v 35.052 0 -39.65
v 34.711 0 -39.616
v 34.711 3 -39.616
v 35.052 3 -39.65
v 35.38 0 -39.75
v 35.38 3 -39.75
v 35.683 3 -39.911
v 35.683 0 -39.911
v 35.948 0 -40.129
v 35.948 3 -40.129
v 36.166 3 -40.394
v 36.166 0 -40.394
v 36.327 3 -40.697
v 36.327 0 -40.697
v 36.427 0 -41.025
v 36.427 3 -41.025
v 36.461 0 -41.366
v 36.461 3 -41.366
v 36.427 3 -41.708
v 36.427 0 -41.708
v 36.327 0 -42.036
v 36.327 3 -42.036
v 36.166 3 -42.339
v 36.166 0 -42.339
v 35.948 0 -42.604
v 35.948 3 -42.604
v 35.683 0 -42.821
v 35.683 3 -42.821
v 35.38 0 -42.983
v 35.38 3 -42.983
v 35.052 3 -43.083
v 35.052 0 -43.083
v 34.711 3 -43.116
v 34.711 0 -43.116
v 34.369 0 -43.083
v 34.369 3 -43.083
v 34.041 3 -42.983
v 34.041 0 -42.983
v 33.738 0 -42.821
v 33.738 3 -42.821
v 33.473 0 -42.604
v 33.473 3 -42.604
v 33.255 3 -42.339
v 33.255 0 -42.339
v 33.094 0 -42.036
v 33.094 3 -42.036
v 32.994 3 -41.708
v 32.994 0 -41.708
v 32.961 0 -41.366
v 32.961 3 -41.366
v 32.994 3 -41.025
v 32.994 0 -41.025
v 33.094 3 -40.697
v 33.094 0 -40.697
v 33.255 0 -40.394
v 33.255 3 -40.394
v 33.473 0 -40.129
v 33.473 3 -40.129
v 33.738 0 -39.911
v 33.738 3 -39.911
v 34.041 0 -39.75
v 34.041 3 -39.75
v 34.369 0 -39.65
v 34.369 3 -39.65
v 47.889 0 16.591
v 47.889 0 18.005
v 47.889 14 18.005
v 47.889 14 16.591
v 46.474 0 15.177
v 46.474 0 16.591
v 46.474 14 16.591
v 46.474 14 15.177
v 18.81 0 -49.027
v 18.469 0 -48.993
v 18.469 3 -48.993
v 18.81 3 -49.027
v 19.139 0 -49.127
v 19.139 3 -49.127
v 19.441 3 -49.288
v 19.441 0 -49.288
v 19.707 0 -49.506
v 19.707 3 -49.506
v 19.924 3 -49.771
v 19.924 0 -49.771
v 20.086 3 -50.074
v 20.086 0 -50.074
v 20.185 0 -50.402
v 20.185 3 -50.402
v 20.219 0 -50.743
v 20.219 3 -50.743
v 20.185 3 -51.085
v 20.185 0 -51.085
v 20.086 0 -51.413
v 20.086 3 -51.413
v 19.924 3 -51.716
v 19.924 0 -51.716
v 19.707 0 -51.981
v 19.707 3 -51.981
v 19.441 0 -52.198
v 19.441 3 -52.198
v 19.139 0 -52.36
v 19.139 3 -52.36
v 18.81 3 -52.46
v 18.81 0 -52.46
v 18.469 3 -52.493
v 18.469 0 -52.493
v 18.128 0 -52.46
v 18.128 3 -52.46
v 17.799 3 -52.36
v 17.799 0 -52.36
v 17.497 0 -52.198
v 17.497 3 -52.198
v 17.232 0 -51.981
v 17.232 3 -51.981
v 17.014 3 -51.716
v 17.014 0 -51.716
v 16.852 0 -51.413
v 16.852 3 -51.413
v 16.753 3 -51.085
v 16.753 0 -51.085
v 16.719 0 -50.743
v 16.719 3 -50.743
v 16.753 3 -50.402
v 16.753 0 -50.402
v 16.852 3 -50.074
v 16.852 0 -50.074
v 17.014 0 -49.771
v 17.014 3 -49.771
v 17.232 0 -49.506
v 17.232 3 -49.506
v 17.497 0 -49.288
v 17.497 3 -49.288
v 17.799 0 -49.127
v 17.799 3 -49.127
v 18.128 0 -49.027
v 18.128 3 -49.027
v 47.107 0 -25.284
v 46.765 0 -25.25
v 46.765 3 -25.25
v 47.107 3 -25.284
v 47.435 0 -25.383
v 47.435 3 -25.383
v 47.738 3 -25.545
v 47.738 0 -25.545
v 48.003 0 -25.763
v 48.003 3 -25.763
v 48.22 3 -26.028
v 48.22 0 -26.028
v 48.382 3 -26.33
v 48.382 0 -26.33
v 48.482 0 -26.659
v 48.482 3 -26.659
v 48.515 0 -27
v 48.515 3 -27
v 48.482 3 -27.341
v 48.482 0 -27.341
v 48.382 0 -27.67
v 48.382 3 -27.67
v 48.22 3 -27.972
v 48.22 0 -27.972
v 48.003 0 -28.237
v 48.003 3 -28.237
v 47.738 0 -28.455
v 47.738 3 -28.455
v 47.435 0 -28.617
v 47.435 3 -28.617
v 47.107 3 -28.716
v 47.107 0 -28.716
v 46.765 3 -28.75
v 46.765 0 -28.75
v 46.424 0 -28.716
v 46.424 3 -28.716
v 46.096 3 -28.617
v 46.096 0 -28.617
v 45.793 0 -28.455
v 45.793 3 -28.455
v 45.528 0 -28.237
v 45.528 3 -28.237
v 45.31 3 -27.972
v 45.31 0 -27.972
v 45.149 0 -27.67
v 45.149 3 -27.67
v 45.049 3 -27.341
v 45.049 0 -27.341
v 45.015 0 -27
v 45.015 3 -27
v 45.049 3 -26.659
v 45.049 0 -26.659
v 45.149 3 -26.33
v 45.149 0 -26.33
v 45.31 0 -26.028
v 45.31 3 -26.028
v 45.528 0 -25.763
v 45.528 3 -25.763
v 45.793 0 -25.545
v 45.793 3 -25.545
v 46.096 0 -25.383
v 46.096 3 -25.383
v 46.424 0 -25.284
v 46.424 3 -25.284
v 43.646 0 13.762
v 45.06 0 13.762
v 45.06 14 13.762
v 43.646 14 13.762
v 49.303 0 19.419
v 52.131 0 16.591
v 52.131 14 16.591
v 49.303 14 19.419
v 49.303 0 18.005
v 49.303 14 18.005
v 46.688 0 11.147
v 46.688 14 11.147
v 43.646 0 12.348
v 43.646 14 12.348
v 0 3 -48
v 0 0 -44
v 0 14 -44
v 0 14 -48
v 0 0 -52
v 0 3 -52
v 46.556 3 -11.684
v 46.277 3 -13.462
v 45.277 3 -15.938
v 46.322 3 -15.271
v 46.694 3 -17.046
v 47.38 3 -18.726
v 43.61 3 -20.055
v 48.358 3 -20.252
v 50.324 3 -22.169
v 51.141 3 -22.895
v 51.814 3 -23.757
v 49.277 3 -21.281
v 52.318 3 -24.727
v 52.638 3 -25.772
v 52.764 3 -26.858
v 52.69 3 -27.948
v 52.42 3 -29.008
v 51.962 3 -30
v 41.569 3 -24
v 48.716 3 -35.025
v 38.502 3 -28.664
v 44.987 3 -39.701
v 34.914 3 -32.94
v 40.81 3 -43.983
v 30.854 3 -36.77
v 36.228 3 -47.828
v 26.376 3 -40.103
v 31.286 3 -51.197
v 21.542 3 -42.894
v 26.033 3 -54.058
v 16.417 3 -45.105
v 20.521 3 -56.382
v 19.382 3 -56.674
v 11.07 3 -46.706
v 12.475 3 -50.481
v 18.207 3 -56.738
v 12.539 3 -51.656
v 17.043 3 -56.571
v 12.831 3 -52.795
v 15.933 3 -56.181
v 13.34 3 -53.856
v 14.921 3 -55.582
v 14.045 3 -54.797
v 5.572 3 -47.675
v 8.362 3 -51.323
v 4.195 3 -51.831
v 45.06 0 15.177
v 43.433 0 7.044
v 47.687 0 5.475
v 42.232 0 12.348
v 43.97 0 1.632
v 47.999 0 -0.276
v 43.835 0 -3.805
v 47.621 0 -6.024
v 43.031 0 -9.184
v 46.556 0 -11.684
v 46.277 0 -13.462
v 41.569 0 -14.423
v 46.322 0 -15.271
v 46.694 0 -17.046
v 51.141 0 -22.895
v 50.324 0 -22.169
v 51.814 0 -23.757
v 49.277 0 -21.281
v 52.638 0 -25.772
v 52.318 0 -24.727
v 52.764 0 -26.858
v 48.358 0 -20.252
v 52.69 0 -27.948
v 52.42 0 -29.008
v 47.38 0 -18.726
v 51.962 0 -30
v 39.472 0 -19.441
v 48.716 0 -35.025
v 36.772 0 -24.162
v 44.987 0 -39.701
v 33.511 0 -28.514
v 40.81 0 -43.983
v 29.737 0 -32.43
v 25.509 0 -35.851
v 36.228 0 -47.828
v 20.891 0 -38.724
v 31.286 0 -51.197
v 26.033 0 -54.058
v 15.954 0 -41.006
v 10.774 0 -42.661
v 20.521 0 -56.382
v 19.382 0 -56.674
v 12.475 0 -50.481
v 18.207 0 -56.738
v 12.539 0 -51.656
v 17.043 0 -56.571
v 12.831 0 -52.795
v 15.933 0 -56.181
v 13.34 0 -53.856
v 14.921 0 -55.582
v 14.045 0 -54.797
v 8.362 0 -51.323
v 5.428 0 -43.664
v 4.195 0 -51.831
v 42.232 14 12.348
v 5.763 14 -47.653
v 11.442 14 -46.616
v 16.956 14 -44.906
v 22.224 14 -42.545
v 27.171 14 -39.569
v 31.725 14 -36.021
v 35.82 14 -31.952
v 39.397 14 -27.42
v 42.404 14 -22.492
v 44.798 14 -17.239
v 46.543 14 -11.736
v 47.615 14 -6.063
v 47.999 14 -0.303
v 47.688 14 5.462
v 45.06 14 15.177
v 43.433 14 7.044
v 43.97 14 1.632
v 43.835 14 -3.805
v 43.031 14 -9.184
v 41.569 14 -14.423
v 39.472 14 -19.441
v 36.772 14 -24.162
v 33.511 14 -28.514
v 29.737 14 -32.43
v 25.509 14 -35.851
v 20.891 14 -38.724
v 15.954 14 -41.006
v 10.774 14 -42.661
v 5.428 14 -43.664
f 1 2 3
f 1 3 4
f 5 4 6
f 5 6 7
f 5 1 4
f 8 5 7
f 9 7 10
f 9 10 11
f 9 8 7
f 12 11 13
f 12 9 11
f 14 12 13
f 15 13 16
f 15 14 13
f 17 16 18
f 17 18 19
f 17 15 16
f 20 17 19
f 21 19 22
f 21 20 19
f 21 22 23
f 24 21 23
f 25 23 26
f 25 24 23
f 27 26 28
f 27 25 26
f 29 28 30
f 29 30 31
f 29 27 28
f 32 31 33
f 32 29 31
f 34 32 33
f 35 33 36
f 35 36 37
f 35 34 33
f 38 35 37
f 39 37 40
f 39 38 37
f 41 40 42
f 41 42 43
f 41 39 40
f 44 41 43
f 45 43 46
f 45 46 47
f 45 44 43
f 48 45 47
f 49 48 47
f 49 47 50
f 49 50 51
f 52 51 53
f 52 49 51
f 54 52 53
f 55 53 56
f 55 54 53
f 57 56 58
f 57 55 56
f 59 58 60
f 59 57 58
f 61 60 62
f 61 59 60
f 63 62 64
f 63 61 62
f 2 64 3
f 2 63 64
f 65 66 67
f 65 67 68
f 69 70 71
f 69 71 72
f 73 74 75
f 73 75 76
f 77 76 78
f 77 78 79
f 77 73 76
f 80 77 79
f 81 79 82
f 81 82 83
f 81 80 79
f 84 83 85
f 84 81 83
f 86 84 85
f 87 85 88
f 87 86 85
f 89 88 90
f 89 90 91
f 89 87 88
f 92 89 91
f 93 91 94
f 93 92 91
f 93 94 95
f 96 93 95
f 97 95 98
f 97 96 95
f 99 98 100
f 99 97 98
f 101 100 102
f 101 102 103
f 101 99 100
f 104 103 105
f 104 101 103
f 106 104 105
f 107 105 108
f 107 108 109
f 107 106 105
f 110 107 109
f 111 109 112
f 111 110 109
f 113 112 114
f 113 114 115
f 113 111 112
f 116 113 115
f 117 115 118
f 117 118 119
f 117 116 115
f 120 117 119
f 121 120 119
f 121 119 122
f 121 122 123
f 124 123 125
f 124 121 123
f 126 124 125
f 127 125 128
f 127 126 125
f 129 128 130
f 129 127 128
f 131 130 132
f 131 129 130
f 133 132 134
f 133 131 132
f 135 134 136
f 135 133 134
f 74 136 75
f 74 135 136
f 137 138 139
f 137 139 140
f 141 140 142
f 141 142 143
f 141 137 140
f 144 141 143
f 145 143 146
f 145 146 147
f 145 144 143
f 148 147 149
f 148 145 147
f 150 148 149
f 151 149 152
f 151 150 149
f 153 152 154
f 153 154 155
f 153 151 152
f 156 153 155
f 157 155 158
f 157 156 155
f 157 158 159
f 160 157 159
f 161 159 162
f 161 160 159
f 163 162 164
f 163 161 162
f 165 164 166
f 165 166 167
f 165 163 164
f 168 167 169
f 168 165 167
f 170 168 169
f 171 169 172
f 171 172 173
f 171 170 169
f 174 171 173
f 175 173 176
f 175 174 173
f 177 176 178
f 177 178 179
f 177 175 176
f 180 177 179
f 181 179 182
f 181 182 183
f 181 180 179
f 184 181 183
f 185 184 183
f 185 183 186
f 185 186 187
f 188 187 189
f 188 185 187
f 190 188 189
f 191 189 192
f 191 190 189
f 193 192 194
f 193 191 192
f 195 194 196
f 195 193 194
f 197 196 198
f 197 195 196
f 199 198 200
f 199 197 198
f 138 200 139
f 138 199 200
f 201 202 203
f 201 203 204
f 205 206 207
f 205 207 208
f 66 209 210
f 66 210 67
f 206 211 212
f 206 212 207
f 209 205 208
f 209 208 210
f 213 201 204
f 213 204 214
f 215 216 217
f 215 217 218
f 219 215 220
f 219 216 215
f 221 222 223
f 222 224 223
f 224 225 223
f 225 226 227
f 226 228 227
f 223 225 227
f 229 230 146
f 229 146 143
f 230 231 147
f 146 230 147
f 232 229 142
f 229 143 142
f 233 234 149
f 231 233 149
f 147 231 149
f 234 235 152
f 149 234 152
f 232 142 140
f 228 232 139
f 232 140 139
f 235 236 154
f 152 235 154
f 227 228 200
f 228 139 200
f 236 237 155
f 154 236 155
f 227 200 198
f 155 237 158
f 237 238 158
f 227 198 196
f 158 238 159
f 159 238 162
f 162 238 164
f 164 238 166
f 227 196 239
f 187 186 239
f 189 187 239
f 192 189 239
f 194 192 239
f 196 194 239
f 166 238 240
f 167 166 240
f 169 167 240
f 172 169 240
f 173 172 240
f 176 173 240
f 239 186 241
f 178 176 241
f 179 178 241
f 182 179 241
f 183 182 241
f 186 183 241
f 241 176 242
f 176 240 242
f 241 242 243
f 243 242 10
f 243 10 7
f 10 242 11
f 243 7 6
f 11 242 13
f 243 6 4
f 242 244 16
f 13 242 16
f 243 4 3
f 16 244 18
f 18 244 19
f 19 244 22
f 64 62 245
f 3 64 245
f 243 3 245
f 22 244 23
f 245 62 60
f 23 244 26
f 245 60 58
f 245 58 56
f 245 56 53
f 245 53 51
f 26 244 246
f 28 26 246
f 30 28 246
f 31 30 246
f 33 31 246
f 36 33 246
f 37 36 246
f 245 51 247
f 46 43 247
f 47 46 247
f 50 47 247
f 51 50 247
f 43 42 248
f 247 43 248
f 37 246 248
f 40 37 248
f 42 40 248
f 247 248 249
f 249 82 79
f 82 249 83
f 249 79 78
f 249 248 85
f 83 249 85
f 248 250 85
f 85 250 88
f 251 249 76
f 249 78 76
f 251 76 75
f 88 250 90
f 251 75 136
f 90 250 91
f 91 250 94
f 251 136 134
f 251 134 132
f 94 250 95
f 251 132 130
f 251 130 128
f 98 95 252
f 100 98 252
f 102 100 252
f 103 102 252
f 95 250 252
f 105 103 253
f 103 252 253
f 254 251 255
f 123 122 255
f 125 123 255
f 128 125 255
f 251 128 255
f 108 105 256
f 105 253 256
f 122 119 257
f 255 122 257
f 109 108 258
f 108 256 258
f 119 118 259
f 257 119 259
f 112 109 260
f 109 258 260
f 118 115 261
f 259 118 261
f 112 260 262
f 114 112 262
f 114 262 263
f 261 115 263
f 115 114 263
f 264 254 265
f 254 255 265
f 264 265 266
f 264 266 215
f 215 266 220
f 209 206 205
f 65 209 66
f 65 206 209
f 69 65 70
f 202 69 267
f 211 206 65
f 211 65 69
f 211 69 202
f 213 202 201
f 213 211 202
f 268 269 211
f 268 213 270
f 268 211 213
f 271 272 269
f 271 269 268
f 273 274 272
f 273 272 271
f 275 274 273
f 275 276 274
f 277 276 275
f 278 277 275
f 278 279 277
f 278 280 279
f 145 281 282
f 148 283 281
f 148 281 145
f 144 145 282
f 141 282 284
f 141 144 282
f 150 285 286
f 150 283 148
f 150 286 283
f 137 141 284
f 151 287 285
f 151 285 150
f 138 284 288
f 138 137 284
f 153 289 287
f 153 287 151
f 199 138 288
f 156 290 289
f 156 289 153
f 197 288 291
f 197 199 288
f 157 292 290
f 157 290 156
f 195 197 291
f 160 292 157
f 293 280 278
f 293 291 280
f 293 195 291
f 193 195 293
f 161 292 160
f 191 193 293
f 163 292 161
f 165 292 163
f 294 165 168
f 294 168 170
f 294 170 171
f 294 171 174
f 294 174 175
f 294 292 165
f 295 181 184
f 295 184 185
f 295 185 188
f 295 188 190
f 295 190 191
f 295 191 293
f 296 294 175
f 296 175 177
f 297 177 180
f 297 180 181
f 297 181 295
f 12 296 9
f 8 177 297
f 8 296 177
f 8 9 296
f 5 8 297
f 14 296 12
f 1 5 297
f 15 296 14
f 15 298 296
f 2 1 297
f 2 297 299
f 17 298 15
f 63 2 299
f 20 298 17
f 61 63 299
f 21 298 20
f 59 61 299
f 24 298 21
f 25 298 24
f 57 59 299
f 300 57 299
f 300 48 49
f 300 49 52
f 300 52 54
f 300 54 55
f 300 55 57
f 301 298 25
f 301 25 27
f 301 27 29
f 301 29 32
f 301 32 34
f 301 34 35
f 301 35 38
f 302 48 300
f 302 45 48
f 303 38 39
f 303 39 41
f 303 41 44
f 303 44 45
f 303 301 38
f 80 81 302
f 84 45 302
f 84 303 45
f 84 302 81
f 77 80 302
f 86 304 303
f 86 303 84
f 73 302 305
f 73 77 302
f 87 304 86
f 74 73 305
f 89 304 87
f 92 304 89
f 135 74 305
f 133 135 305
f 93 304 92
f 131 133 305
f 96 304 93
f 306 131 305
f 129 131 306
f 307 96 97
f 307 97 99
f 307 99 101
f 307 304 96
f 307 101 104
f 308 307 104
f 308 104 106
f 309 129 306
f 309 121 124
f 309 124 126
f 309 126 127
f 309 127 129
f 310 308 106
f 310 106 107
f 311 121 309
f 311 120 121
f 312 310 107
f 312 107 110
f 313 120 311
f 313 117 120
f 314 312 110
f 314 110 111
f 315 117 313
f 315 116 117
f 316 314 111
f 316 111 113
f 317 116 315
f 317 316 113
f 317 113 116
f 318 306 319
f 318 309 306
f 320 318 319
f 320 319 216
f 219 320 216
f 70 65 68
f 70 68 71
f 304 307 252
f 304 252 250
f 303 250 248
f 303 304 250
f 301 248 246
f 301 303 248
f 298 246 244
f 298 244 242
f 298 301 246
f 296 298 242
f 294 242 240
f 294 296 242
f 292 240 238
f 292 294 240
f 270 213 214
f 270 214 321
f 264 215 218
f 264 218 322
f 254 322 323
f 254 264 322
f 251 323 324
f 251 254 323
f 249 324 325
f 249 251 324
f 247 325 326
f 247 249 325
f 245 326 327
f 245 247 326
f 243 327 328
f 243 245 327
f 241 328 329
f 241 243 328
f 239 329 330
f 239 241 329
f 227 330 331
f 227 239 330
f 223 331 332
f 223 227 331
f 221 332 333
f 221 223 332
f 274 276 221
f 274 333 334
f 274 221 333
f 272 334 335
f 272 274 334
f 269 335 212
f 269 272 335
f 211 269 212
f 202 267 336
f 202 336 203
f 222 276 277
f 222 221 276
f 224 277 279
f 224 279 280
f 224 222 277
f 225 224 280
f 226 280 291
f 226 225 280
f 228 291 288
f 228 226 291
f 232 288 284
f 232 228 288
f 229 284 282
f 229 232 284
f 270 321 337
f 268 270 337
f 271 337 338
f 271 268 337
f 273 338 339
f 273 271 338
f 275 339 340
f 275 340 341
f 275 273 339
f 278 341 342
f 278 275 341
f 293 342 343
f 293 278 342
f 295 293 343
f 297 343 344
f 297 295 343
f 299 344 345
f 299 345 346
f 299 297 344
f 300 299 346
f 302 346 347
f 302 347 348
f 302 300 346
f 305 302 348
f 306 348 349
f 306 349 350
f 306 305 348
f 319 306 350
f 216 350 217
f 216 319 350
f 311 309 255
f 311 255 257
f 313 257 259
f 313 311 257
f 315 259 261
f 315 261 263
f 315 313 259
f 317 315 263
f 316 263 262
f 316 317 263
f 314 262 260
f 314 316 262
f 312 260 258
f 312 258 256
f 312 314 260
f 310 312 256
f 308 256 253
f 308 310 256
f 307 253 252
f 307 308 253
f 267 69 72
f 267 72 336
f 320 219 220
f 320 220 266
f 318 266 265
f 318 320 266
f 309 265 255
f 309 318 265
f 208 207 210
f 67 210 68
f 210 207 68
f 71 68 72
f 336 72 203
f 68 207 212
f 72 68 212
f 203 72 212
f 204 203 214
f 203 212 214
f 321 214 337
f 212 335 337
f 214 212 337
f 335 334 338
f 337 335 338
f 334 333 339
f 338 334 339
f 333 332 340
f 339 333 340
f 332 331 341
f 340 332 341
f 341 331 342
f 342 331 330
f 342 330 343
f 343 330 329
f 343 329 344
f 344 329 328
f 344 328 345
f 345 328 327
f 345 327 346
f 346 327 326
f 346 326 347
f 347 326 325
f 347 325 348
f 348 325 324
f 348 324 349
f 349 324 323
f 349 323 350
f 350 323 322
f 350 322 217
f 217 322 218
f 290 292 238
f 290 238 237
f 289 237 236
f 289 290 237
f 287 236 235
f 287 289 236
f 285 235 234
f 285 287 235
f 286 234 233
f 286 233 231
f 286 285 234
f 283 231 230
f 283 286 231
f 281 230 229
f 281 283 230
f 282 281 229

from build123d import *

# Parameters (mm, degrees)
SKETCH_1_R              = 1.75
EXTRUDE_1_DEPTH         = 3
EXTRUDE_2586_DEPTH      = 11
EXTRUDE_2586_DEPTH_BACK = 3
FILLET1_R               = 10


with BuildPart() as part:
    # Эскиз1 → Бобышка-Вытянуть1 (new body)
    with BuildSketch(Plane(origin=(0, 0, 0), x_dir=(1, 0, 0), z_dir=(0, 1, 0))):
        with BuildLine():
            Line((0, 48), (0, 52))
            ThreePointArc((0, 52), (6.283445482, 51.618972412), (12.474807654, 50.481473572))
            ThreePointArc((12.474807654, 50.481473572), (14.921144436, 55.582006519), (20.5212086, 56.381557247))
            ThreePointArc((20.5212086, 56.381557247), (38.567256581, 45.962666587), (51.961524227, 30))
            ThreePointArc((51.961524227, 30), (49.765371804, 21.803847577), (41.569219382, 24))
            ThreePointArc((41.569219382, 24), (24, 41.569219382), (0, 48))
        make_face()
        with Locations(Location((34.710530923, 41.366399928, 0), (0, 0, 270))):
            Circle(SKETCH_1_R, mode=Mode.SUBTRACT)
        with Locations(Location((18.46908774, 50.743401522, 0), (0, 0, 270))):
            Circle(SKETCH_1_R, mode=Mode.SUBTRACT)
        with Locations(Location((46.765371804, 27, 0), (0, 0, 270))):
            Circle(SKETCH_1_R, mode=Mode.SUBTRACT)
    extrude(amount=EXTRUDE_1_DEPTH)

    # Эскиз2 → Extrude 2586 (add, two sides: drawn at the far end of the back side and taken through both)
    with BuildSketch(Plane(origin=(0, 3, 0), x_dir=(1, 0, 0), z_dir=(0, 1, 0)).offset(-EXTRUDE_2586_DEPTH_BACK)):
        with BuildLine():
            Line((49.302845964, -19.419222091), (49.302845964, -18.005008529))
            Line((49.302845964, -18.005008529), (47.888632402, -18.005008529))
            Line((47.888632402, -18.005008529), (47.888632402, -16.590794966))
            Line((47.888632402, -16.590794966), (46.474418839, -16.590794966))
            Line((46.474418839, -16.590794966), (46.474418839, -15.176581404))
            Line((46.474418839, -15.176581404), (45.060205277, -15.176581404))
            Line((45.060205277, -15.176581404), (45.060205277, -13.762367842))
            Line((45.060205277, -13.762367842), (43.645991715, -13.762367842))
            Line((43.645991715, -13.762367842), (43.645991715, -12.348154279))
            Line((43.645991715, -12.348154279), (42.231778152, -12.348154279))
            ThreePointArc((42.231778152, -12.348154279), (35.208797113, 26.388266443), (0, 44))
            Line((0, 44), (0, 48))
            ThreePointArc((0, 48), (37.676689525, 29.73999103), (46.687683687, -11.147205565))
            Line((46.687683687, -11.147205565), (52.131273089, -16.590794966))
            Line((52.131273089, -16.590794966), (49.302845964, -19.419222091))
        make_face()
    extrude(amount=EXTRUDE_2586_DEPTH + EXTRUDE_2586_DEPTH_BACK)

    # Fillet1
    fillet1_edges = [part.edges().sort_by_distance(p)[0] for p in [
        (41.569219382, 1.5, -24),
    ]]
    fillet(fillet1_edges, radius=FILLET1_R)


solid = part.part
